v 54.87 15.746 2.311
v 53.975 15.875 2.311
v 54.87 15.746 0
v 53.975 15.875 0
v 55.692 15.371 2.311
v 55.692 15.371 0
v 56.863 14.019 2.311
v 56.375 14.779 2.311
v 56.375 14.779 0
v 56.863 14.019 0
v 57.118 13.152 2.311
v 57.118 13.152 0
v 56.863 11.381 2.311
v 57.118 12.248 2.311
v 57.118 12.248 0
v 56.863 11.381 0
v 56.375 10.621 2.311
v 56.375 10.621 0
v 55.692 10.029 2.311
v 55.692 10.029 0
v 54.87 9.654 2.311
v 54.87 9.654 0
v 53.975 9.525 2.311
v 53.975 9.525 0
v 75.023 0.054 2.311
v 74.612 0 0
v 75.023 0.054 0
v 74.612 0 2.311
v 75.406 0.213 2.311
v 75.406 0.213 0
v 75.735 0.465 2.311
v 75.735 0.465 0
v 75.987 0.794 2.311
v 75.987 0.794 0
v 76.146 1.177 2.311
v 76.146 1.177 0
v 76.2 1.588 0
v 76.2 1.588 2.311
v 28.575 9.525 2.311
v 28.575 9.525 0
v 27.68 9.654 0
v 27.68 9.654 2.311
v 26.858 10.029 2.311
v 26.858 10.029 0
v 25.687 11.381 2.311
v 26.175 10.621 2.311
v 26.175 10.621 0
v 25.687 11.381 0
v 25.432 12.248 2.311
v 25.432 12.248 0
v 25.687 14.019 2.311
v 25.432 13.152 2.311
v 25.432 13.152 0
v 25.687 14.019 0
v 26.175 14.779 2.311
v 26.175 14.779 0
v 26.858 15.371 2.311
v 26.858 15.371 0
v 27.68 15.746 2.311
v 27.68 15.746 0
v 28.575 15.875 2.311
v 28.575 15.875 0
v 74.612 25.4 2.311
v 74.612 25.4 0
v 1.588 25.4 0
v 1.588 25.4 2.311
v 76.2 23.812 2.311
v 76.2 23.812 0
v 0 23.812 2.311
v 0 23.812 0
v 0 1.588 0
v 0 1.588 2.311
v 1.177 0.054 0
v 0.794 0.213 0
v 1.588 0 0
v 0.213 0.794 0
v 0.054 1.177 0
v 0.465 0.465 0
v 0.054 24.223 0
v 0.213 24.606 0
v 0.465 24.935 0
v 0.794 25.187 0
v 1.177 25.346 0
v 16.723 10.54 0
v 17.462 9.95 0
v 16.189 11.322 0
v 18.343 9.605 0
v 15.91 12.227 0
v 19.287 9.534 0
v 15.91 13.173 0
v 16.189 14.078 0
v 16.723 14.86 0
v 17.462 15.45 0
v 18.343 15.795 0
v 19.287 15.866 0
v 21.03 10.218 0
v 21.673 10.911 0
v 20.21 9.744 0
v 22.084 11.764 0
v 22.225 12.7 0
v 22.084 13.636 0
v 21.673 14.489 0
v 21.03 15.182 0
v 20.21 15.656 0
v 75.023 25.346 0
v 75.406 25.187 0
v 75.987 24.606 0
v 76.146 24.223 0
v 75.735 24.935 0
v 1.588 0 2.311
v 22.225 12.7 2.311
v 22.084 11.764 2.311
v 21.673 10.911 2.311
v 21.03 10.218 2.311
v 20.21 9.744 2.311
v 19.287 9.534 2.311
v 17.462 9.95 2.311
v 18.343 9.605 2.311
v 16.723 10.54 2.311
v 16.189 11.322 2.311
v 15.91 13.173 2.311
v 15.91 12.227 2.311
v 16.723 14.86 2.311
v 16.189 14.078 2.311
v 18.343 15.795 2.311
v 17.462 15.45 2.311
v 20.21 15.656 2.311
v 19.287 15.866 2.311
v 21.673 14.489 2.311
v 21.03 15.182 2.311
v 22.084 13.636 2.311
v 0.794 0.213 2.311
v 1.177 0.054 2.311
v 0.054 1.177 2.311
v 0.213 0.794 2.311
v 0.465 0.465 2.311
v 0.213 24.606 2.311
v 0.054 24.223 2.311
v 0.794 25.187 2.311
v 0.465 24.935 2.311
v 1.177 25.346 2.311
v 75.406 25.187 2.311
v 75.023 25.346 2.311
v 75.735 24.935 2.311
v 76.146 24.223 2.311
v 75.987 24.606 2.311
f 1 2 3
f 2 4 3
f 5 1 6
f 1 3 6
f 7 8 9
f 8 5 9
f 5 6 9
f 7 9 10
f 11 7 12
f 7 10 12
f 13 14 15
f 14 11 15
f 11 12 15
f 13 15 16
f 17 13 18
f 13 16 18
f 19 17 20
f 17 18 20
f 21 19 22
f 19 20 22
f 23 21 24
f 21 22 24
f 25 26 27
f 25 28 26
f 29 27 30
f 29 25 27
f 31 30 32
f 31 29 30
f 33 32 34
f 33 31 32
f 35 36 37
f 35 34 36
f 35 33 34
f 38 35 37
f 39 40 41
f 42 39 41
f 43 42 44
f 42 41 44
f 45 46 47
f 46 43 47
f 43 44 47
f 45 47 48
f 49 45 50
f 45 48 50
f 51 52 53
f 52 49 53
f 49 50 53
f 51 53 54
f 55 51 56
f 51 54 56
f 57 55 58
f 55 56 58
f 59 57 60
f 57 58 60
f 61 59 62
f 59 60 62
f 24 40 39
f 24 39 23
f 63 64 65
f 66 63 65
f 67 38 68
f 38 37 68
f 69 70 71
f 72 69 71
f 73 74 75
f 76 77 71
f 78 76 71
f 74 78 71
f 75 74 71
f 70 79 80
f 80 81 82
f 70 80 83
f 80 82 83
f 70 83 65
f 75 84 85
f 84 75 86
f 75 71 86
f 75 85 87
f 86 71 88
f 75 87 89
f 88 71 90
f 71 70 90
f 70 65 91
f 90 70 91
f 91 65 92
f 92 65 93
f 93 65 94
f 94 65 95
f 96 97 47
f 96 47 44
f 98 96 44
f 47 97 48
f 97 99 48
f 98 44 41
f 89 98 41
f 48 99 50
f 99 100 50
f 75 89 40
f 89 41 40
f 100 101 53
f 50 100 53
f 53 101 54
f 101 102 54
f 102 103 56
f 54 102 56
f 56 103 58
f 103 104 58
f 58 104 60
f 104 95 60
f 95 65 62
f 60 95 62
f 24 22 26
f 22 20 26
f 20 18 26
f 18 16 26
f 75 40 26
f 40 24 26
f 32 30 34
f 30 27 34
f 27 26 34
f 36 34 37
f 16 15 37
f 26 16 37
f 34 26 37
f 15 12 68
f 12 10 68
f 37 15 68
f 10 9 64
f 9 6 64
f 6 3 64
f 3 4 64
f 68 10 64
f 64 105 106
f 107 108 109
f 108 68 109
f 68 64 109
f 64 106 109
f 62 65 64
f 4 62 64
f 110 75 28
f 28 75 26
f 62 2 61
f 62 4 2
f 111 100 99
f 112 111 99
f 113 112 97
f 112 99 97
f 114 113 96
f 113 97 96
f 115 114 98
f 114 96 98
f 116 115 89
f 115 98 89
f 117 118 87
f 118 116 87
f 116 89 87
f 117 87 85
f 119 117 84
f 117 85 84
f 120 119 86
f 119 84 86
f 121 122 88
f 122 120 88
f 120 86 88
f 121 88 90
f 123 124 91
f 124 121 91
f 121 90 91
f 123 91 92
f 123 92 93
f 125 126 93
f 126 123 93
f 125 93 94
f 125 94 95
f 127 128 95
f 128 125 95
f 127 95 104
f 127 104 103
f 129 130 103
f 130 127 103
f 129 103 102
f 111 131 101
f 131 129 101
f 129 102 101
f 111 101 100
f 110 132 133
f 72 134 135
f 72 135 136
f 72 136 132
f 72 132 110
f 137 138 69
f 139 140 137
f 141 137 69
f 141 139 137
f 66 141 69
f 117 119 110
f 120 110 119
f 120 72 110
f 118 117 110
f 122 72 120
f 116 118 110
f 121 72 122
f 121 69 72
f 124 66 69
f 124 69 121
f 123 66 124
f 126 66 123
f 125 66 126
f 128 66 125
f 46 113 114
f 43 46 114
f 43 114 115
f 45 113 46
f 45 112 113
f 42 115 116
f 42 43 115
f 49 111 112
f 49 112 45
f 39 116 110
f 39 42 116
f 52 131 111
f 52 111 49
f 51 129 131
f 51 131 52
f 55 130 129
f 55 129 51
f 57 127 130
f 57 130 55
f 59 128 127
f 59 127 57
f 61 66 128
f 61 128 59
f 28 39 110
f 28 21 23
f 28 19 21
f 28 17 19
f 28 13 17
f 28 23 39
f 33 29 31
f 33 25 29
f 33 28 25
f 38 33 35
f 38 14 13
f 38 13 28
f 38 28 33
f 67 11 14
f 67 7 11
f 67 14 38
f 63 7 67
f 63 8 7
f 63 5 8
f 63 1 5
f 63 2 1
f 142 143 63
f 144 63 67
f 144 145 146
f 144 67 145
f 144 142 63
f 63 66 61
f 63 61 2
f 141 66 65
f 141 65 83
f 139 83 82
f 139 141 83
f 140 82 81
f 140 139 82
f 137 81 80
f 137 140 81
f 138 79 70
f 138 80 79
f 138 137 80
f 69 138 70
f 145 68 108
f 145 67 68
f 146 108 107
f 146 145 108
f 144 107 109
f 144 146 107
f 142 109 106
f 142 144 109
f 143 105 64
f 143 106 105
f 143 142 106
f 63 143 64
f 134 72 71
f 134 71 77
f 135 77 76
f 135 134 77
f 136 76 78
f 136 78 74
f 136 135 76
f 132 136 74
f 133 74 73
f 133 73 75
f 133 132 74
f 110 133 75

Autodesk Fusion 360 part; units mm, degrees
sketch "Sketch1" plane through (0, 0, 0) normal (0, 0, 1) x (1, 0, 0) in component "Chain Guard"
  line L0 (0, 0) -> (76.2, 0)
  line L1 (76.2, 0) -> (76.2, 25.4)
  line L2 (76.2, 25.4) -> (0, 25.4)
  line L3 (0, 25.4) -> (0, 0)
  line L4 (0, 12.7) -> (76.2, 12.7) construction
  circle A0 centre (19.05, 12.7) radius 3.175
  line L5 (28.575, 9.525) -> (53.975, 9.525)
  arc A1 (53.975, 9.525) -> (53.975, 15.875) centre (53.975, 12.7) ccw
  line L6 (53.975, 15.875) -> (28.575, 15.875)
  arc A2 (28.575, 15.875) -> (28.575, 9.525) centre (28.575, 12.7) ccw
  line L7 (28.575, 12.7) -> (53.975, 12.7) construction
  dimension "d2" = 76.2
  dimension "d3" = 25.4
  dimension "d4" = 6.35
  dimension "d5" = 19.05
  dimension "d6" = 6.35
  dimension "d7" = 28.575
  dimension "d8" = 25.4
extrude "Extrude1" add sketch "Sketch1" along normal blind 2.3114 in component "Chain Guard"
fillet "Fillet1" radius 1.5875 4 edges at (76.2, 0, 1.1557) (76.2, 25.4, 1.1557) (0, 25.4, 1.1557) (0, 0, 1.1557) in component "Chain Guard"
component "Chain Guard" placed x (1, 0, 0) y (0, 1, 0) z (0, 0, 1) at (0, 0, 0)
